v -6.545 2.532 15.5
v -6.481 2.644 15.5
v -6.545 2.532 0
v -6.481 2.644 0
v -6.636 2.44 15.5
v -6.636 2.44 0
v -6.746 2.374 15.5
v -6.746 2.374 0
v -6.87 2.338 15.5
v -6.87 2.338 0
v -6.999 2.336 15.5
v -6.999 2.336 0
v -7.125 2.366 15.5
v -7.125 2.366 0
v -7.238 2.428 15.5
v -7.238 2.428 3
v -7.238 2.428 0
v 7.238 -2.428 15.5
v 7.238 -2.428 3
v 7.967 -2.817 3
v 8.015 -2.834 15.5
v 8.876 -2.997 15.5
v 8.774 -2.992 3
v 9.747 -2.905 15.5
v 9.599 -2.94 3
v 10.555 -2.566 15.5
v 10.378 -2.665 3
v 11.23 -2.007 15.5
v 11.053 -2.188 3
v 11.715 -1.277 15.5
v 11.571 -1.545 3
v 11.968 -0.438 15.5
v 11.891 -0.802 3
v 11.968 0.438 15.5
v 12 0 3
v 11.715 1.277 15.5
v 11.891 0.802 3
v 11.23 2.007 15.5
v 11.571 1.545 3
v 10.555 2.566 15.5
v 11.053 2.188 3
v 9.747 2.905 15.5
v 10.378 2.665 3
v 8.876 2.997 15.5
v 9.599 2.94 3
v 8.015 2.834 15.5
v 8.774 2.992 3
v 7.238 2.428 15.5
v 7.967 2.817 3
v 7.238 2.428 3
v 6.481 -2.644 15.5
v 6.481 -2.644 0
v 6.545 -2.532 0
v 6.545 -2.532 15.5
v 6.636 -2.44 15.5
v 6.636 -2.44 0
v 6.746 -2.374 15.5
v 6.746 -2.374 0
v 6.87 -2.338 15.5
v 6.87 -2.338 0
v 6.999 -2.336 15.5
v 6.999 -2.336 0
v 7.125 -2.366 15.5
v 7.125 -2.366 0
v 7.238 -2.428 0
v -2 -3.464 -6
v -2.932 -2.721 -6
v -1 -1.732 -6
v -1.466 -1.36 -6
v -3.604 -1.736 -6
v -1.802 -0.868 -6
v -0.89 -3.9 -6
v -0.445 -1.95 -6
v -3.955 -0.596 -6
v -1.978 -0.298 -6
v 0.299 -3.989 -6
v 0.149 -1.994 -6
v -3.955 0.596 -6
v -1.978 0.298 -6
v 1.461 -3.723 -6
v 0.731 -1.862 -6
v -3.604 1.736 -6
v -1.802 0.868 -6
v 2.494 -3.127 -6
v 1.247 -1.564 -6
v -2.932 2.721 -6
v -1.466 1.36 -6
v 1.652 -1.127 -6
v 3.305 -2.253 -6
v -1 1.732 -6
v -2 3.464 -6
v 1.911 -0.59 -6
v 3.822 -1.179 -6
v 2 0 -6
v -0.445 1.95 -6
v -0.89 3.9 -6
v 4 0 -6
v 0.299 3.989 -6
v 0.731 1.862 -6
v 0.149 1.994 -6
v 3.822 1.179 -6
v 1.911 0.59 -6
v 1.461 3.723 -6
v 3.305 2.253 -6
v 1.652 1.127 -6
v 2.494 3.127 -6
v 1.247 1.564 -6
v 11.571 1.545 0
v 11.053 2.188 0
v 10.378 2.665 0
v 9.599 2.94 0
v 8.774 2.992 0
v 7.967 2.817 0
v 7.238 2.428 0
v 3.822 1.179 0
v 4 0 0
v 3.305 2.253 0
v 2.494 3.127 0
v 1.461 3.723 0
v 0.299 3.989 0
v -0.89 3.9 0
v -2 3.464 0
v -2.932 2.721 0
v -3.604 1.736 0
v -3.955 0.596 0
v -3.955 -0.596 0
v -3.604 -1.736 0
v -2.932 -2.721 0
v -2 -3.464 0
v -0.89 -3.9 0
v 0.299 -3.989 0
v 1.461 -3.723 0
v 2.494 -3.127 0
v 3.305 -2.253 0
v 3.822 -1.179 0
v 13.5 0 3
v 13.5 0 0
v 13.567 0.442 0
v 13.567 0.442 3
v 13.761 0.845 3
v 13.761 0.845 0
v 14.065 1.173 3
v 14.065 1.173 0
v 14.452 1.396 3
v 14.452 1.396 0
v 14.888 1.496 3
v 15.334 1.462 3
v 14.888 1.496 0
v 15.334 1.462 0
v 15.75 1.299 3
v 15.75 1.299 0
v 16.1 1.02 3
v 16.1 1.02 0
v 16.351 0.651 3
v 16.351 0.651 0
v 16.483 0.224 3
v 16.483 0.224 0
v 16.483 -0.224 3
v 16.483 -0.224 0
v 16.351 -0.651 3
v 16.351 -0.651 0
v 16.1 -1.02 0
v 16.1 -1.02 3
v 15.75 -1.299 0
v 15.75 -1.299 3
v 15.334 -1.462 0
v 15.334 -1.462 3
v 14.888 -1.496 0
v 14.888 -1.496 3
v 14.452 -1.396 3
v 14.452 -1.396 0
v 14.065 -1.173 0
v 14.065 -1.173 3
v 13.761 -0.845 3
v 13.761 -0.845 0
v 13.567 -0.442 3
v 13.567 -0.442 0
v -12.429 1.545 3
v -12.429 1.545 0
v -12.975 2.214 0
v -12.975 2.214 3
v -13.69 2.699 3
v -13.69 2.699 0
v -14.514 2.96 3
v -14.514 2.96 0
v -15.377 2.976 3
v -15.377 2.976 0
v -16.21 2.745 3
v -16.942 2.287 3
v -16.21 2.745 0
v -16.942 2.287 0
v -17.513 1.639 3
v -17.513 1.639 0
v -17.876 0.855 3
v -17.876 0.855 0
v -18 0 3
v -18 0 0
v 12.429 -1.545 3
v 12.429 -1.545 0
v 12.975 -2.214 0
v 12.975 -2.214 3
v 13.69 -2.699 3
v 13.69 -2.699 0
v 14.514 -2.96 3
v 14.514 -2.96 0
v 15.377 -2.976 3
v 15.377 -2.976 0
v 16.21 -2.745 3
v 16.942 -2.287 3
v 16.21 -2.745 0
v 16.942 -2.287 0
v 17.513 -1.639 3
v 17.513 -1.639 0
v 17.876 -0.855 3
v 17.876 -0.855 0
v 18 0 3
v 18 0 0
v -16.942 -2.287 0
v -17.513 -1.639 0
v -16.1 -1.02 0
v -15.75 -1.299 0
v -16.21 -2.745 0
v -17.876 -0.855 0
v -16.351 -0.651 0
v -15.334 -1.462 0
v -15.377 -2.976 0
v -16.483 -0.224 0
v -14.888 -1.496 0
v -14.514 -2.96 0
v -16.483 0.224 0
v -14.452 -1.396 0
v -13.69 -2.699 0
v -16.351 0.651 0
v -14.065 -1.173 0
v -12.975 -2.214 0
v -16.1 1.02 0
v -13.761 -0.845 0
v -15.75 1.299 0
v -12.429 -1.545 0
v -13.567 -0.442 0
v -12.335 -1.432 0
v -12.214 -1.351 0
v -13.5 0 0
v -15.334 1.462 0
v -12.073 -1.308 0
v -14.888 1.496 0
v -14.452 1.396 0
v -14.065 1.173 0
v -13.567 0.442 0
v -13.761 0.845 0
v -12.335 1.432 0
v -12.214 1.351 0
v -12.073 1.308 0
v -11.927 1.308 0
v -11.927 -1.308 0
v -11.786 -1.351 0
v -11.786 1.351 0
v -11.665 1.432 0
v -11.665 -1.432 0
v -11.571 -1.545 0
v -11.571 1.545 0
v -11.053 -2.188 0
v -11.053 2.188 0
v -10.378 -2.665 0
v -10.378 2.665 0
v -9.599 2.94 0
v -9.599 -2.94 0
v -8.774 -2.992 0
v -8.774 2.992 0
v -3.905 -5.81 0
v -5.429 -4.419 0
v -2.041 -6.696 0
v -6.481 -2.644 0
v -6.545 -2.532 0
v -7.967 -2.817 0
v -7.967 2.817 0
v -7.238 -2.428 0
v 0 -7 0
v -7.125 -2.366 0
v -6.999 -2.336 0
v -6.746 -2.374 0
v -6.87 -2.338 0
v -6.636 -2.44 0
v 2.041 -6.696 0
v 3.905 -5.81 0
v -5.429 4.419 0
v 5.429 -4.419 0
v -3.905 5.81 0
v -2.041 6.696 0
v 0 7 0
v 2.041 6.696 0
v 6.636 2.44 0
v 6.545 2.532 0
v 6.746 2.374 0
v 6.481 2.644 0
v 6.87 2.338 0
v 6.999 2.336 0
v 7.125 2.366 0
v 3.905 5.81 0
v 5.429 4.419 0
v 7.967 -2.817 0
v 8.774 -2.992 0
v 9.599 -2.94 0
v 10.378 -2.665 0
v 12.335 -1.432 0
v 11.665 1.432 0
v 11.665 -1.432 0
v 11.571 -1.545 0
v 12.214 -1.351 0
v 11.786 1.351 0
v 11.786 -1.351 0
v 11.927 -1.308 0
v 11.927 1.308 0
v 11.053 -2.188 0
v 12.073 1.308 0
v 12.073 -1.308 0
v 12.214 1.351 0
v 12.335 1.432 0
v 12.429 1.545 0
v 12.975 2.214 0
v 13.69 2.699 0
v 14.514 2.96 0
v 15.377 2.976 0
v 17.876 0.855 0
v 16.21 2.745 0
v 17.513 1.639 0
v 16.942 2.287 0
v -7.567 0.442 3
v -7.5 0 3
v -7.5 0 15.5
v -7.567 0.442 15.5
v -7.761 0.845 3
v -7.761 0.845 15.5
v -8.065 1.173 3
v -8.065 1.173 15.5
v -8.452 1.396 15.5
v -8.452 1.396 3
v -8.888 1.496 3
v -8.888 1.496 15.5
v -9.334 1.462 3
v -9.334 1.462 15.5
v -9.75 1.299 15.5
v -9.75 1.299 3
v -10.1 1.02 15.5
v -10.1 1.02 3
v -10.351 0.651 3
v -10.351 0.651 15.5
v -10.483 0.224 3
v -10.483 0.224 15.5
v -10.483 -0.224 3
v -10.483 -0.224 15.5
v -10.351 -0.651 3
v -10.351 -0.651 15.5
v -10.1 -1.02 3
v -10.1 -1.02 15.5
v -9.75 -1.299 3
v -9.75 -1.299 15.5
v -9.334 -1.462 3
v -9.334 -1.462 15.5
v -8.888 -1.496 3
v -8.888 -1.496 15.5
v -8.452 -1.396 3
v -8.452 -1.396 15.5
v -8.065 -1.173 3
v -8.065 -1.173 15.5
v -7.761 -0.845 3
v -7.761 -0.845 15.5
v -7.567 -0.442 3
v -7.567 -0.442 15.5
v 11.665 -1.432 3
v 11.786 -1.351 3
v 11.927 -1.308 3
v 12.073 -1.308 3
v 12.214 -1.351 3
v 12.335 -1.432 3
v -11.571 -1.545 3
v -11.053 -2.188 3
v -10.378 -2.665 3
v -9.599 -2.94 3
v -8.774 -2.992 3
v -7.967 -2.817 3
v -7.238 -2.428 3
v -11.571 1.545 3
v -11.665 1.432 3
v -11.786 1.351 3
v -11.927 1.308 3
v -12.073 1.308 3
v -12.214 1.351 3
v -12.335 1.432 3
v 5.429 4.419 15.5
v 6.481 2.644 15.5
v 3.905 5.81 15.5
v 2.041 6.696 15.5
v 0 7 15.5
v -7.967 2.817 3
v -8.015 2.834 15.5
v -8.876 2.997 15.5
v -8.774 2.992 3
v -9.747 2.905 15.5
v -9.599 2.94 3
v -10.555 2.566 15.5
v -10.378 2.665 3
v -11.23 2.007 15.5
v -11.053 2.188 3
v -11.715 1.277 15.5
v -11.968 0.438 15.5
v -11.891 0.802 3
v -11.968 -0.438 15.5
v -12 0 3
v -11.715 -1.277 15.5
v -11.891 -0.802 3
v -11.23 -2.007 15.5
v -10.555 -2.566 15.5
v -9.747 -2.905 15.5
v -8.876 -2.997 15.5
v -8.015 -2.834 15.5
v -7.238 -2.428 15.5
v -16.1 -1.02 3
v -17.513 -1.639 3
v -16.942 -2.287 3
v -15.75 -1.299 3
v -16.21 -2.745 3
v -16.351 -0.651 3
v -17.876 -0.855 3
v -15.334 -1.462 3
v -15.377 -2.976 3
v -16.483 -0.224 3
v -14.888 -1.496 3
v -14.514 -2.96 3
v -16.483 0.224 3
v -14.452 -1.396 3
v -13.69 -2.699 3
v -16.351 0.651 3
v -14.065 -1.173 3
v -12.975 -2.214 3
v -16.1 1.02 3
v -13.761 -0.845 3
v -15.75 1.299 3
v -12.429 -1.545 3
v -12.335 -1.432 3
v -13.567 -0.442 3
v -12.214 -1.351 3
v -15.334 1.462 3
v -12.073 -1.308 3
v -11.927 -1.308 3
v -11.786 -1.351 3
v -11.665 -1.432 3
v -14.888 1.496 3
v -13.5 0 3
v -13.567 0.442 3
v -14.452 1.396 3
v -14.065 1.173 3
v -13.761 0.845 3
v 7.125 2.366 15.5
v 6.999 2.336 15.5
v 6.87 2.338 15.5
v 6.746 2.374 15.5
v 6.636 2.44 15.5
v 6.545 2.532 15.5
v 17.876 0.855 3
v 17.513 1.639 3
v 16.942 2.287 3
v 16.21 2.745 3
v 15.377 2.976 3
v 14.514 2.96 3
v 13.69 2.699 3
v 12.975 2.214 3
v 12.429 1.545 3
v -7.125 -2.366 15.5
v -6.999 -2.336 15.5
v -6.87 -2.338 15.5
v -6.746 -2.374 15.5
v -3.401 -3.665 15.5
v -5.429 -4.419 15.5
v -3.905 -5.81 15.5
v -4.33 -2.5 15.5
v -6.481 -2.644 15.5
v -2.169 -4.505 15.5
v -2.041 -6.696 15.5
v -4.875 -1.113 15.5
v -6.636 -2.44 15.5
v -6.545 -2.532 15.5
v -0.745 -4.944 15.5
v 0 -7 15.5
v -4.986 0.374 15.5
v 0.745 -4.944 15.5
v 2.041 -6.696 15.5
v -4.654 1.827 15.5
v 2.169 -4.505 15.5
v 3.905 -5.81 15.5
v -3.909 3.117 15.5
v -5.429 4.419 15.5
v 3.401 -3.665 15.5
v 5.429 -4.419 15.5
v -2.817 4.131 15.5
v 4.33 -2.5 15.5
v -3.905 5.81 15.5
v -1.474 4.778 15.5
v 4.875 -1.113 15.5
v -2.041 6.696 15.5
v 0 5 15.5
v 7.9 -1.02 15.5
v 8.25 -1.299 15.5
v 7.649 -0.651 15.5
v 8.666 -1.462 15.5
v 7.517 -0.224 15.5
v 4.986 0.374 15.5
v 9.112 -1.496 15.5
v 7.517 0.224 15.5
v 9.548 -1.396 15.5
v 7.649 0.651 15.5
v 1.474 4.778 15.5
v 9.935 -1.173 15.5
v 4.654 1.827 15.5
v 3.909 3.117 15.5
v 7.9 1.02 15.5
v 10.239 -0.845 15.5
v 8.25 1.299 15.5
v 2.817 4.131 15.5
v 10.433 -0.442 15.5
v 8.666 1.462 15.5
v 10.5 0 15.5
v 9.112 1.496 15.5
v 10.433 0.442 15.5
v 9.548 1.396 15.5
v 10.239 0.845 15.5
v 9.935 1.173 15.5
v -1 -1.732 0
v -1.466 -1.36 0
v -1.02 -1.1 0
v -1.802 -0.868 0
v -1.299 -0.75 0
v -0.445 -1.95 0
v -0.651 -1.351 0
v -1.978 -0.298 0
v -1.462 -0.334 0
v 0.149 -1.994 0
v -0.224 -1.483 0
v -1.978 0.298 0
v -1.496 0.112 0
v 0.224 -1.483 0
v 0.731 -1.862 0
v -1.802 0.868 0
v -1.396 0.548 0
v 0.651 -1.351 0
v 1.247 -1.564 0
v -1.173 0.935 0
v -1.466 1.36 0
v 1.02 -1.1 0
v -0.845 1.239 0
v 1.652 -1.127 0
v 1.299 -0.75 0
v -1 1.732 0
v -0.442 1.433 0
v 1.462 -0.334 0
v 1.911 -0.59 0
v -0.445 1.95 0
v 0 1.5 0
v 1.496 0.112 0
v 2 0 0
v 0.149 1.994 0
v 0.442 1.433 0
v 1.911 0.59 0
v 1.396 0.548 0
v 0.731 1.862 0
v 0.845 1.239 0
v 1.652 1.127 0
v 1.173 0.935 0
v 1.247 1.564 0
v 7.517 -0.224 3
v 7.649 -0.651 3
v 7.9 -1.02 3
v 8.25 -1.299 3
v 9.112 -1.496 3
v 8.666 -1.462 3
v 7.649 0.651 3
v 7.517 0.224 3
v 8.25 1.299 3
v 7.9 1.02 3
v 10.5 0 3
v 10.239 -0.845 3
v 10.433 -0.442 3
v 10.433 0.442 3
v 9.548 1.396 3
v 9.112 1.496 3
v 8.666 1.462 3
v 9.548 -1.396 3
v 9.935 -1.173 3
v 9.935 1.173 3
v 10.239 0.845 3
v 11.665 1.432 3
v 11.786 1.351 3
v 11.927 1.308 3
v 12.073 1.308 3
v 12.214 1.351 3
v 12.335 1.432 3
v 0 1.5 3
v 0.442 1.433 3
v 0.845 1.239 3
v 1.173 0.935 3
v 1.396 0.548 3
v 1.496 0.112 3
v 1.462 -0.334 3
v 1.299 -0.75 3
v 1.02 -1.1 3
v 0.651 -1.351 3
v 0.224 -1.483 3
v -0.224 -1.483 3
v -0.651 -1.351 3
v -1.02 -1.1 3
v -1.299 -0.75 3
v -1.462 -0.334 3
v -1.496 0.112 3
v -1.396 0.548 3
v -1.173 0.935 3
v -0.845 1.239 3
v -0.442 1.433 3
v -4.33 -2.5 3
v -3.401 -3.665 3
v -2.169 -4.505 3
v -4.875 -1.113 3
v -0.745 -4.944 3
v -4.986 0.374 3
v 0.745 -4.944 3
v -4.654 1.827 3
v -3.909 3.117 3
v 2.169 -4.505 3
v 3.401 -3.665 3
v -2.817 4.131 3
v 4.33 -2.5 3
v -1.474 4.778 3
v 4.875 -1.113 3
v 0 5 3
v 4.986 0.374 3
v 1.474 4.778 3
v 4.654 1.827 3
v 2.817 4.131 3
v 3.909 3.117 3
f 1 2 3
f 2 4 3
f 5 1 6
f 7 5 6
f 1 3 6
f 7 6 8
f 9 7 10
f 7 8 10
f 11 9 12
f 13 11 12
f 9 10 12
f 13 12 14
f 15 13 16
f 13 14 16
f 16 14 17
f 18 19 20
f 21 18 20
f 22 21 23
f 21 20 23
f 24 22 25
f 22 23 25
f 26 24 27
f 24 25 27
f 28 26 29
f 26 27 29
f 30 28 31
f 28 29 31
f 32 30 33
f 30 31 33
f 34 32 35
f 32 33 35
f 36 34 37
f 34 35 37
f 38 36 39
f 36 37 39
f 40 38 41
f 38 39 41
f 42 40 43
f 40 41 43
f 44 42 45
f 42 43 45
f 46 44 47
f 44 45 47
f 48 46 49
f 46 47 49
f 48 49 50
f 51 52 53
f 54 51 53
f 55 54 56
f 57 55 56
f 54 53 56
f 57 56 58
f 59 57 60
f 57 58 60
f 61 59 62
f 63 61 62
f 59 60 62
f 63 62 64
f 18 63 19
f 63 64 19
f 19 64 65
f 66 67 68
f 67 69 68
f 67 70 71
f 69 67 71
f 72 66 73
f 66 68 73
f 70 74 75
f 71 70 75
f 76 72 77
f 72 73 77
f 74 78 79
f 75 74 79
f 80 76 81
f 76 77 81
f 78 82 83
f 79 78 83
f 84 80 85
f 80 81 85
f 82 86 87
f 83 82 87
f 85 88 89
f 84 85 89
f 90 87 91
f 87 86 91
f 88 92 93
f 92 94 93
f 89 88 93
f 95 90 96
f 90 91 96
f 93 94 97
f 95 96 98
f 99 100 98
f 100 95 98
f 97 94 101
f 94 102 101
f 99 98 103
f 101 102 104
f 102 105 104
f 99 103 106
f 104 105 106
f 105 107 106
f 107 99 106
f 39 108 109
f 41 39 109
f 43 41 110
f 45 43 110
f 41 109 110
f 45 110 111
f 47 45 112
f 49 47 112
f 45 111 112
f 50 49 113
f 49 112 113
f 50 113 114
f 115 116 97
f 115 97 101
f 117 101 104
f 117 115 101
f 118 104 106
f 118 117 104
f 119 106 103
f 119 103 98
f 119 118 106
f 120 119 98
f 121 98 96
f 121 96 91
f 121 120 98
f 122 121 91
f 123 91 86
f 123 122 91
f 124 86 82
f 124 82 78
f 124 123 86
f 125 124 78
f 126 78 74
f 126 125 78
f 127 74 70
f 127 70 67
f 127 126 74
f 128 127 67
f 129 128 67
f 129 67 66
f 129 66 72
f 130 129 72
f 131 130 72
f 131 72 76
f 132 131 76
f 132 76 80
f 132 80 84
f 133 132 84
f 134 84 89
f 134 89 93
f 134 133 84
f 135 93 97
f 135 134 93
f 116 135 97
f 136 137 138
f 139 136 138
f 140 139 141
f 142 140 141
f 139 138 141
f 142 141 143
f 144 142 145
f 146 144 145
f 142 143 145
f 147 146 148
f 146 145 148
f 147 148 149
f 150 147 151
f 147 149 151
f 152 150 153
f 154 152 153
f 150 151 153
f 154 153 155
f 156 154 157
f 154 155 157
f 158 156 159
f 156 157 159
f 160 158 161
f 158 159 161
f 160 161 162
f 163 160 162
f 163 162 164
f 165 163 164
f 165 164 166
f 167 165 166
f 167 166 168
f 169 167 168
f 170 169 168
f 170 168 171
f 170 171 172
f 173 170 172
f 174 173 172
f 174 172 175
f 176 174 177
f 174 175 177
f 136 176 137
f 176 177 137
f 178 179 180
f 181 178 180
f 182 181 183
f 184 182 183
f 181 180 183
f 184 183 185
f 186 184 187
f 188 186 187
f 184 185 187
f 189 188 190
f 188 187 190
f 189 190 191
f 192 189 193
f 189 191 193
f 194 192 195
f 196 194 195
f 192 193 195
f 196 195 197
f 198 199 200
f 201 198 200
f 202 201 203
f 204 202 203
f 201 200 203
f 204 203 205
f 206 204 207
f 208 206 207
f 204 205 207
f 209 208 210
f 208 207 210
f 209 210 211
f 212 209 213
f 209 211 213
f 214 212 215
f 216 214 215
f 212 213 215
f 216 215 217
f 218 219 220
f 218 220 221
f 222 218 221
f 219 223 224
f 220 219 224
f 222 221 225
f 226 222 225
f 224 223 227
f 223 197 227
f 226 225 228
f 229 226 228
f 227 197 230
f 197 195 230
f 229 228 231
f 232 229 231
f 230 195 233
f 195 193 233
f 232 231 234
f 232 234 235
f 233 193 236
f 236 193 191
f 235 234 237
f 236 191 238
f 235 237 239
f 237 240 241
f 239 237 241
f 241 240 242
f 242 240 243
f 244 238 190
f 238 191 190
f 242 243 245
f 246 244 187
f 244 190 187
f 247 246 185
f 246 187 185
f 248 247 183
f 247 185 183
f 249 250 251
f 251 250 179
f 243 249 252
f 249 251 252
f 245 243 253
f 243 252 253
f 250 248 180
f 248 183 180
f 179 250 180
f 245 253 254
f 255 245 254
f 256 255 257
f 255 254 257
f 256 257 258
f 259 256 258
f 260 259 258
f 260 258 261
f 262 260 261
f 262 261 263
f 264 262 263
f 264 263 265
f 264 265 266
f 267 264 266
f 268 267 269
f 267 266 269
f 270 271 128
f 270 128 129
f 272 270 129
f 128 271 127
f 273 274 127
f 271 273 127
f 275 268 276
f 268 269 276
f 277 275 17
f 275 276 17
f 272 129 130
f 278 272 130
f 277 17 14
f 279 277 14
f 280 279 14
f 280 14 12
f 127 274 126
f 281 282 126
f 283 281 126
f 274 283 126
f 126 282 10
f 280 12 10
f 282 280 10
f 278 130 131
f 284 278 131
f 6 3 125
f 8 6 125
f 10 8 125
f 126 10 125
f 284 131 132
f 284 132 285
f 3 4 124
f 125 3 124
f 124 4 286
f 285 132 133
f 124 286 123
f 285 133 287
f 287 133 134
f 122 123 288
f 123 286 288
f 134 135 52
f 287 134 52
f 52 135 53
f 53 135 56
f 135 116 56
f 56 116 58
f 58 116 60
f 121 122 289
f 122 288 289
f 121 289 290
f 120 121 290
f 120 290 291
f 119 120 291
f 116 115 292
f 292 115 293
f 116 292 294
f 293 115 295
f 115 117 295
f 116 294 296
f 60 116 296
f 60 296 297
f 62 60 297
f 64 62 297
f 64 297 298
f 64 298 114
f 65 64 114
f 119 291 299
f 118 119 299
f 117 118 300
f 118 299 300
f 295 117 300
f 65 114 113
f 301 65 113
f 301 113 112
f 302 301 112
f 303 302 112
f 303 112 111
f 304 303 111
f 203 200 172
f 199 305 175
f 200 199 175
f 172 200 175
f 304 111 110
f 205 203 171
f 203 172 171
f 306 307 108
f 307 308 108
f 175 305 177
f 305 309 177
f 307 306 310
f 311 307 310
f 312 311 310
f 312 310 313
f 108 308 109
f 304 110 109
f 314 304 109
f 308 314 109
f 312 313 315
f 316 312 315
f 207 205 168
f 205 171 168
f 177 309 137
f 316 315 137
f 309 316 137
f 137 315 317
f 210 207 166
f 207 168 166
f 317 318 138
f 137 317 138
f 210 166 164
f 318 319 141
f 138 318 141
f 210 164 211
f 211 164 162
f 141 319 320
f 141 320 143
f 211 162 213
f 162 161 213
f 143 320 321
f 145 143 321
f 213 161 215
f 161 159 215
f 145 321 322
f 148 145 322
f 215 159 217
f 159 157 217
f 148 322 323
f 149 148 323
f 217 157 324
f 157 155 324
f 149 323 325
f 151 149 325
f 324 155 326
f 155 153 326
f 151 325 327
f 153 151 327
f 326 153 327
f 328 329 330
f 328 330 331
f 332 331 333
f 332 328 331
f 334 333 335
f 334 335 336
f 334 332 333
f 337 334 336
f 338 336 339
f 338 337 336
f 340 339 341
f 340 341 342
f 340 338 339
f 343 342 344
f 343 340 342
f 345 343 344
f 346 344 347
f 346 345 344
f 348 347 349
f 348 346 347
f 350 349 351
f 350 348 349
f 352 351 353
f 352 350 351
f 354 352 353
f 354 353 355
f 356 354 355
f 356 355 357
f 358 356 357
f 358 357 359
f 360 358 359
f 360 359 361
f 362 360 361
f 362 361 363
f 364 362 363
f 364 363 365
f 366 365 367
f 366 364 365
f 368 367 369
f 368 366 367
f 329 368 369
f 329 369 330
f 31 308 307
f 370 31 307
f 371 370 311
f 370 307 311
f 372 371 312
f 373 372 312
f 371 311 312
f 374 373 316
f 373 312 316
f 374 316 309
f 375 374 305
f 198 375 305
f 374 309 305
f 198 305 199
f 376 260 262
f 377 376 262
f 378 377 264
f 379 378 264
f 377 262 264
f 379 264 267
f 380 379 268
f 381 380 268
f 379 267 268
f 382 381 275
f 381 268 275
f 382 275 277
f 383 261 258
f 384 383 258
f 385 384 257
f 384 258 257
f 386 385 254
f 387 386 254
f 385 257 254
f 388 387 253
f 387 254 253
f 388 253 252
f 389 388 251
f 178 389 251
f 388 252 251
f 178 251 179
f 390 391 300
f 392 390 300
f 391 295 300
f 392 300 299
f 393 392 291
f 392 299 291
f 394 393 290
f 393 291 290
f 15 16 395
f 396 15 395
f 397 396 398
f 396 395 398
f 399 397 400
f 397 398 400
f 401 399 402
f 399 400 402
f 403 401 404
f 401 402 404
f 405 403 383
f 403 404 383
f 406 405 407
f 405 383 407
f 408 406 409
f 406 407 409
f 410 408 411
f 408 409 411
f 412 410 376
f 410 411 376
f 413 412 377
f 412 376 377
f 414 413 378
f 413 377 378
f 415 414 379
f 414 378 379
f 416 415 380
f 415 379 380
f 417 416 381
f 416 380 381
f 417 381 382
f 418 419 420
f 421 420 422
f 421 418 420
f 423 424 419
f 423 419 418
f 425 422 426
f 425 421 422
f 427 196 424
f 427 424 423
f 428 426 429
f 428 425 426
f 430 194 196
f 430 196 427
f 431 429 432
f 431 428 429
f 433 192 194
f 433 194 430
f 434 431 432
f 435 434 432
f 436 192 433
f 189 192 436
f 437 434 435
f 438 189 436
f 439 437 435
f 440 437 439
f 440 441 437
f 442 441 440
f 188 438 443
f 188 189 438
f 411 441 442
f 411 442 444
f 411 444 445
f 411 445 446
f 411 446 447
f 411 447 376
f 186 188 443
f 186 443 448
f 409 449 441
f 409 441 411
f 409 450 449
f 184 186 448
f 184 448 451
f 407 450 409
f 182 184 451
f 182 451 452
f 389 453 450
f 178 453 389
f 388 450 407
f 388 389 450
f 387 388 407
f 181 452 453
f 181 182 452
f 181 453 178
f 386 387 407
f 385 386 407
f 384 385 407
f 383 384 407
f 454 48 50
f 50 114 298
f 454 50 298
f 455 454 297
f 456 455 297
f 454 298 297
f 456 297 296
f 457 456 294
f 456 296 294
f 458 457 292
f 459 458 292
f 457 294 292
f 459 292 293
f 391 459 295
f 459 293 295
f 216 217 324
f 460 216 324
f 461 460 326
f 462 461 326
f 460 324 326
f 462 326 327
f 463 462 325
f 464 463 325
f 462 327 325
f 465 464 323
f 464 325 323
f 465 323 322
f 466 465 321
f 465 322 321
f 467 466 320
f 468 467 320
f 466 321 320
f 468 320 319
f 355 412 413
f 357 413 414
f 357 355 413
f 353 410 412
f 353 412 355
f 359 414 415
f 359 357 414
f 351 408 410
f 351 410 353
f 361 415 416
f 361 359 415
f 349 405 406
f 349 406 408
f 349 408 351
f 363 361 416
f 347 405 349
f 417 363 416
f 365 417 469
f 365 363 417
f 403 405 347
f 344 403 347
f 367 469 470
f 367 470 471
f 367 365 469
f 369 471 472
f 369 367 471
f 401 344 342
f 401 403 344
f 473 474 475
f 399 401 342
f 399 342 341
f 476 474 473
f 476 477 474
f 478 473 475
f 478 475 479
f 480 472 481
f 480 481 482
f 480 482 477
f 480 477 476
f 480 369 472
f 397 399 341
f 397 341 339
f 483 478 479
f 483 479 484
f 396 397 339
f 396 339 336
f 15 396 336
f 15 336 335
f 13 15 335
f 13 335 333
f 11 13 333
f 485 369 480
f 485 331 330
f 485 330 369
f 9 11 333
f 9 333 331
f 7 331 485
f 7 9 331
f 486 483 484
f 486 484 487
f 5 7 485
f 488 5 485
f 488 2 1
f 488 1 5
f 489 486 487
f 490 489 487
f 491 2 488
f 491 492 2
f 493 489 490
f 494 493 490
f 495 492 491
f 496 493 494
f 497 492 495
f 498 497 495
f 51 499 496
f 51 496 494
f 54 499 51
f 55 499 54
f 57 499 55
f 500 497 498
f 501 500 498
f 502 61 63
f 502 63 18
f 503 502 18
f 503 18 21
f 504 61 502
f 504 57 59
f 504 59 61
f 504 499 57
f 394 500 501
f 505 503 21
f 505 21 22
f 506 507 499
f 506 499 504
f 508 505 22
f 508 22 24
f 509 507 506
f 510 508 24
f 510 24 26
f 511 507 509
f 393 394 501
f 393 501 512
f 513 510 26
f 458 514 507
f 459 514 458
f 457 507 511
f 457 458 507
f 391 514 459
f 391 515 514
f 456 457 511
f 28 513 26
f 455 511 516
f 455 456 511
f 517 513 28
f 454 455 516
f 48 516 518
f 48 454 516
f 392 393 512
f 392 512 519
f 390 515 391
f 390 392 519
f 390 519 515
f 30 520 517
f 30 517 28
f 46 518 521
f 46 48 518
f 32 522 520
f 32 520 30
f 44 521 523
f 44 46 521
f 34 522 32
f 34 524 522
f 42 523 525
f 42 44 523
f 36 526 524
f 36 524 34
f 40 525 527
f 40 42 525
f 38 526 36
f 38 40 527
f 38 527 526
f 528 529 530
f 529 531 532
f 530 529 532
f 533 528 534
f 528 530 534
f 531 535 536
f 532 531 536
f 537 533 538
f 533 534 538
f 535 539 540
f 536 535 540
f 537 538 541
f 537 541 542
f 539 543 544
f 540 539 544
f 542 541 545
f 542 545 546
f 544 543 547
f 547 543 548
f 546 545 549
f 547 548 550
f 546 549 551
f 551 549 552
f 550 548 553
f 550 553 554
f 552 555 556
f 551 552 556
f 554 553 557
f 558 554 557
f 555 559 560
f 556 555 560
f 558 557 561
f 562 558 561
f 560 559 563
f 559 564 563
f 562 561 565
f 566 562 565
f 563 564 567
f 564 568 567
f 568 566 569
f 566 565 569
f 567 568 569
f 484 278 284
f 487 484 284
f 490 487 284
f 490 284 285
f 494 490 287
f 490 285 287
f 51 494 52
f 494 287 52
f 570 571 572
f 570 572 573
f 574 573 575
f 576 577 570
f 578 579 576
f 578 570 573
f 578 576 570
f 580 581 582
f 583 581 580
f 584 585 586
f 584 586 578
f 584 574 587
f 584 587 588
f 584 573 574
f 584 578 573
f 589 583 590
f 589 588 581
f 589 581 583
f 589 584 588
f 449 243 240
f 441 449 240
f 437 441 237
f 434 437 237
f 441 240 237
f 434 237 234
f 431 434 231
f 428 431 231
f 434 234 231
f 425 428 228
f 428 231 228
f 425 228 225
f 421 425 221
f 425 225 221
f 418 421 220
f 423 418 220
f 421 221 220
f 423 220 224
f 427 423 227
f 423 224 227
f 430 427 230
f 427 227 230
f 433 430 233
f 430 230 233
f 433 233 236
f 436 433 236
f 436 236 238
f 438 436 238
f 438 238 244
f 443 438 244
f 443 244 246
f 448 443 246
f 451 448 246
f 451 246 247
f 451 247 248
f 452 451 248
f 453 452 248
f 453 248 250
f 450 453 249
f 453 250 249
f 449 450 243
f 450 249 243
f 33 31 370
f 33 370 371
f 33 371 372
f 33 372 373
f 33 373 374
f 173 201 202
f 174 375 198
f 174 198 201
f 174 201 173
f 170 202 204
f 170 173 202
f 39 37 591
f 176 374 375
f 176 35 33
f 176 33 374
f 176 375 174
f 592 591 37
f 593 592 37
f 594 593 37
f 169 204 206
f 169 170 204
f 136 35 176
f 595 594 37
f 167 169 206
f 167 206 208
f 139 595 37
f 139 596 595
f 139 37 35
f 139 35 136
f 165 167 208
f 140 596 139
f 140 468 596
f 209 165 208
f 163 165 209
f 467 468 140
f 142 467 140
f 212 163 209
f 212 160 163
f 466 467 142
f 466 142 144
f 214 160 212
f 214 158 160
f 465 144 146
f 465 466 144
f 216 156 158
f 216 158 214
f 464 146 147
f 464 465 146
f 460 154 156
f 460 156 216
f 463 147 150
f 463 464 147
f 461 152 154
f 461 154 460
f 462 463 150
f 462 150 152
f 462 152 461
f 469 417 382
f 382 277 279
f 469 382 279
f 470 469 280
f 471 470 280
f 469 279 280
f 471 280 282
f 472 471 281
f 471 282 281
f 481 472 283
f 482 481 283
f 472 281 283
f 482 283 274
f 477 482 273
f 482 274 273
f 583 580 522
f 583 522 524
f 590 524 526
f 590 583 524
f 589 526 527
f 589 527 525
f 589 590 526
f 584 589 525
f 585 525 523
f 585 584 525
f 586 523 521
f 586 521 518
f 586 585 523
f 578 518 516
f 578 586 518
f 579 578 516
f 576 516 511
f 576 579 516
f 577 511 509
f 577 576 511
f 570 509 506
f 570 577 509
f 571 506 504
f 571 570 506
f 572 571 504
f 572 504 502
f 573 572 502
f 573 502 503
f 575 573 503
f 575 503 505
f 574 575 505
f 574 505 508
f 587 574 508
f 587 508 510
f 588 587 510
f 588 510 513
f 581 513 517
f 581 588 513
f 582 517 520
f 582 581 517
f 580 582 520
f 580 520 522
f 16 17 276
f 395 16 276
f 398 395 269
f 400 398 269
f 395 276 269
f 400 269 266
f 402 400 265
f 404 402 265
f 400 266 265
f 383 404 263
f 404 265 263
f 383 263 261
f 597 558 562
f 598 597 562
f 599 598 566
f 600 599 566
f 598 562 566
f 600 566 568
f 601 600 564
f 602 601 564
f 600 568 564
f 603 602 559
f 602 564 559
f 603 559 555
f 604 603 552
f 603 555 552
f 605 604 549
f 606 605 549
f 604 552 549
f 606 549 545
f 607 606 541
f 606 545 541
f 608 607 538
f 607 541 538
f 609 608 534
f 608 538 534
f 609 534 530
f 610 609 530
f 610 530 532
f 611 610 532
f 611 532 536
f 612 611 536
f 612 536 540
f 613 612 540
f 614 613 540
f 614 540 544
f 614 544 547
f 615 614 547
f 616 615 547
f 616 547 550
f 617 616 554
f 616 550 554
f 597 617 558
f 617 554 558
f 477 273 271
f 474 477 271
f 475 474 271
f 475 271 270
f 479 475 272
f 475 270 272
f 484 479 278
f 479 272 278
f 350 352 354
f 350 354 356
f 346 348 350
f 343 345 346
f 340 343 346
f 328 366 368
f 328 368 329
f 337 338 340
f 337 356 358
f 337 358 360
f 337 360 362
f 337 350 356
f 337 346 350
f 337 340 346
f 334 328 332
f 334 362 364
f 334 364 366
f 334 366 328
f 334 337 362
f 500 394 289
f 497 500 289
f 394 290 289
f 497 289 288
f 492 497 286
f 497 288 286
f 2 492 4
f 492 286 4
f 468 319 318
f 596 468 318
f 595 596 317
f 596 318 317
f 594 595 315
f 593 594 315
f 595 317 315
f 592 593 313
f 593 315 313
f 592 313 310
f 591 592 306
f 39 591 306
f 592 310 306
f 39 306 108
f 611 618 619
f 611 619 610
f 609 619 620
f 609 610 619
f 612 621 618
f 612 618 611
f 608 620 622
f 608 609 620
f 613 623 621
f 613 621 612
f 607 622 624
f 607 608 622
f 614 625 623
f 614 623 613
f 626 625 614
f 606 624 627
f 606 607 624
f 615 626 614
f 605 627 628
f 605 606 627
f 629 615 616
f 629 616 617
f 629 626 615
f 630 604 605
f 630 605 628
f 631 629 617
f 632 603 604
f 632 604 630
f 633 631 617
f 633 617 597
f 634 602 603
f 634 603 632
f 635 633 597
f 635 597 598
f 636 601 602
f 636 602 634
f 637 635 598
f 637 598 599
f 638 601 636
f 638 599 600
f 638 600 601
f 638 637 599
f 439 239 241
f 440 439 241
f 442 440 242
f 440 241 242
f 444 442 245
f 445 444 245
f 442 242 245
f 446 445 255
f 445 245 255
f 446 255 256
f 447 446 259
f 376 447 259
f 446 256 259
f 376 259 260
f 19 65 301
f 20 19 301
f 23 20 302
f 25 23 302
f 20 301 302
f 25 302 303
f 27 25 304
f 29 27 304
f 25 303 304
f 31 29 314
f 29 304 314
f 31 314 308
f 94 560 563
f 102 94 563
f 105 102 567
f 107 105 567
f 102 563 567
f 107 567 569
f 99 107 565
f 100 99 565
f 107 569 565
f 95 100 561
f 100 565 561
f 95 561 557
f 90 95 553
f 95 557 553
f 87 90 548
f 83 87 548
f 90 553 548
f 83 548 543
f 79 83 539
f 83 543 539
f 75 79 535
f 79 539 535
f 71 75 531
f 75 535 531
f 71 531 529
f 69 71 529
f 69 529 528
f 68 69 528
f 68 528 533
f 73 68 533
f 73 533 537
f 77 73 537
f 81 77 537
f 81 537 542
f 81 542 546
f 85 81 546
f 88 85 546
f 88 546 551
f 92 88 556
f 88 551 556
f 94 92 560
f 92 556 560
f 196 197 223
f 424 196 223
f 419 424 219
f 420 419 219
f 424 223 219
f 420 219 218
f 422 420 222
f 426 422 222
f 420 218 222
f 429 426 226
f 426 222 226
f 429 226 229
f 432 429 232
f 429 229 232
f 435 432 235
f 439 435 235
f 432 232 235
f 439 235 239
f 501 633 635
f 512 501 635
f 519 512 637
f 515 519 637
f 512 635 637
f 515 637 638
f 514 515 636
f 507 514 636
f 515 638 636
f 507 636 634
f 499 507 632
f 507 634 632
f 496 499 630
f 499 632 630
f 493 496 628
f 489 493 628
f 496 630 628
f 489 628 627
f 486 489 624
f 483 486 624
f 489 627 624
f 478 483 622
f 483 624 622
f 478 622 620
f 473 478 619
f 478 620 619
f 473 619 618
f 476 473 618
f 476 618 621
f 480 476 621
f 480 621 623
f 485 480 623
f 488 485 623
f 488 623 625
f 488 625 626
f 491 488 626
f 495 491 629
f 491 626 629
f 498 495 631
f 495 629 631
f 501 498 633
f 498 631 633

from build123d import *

# Parameters (mm, degrees)
F1_DEPTH = 3
F2_R     = 1.5
F3_DEPTH = 12.5
F4_R     = 4
F4_R_2   = 2
F5_DEPTH = 6


with BuildPart() as f1:
    # F0 (on Top) → F1 (new body)
    with BuildSketch(Plane.XY):
        with BuildLine():
            ThreePointArc((7.238095, 2.428105), (6.807286, 2.351969), (6.481481, 2.643936))
            ThreePointArc((6.481481, 2.643936), (3.904641, 5.8098), (0, 7))
            ThreePointArc((0, 7), (-3.904641, 5.8098), (-6.481481, 2.643936))
            ThreePointArc((-6.481481, 2.643936), (-6.807286, 2.351969), (-7.238095, 2.428105))
            ThreePointArc((-7.238095, 2.428105), (-9.598913, 2.939609), (-11.571429, 1.545236))
            ThreePointArc((-11.571429, 1.545236), (-12, 1.302776), (-12.428571, 1.545236))
            ThreePointArc((-12.428571, 1.545236), (-15.801784, 2.890872), (-18, 0))
            ThreePointArc((-18, 0), (-15.801784, -2.890872), (-12.428571, -1.545236))
            ThreePointArc((-12.428571, -1.545236), (-12, -1.302776), (-11.571429, -1.545236))
            ThreePointArc((-11.571429, -1.545236), (-9.598913, -2.939609), (-7.238095, -2.428105))
            ThreePointArc((-7.238095, -2.428105), (-6.807286, -2.351969), (-6.481481, -2.643936))
            ThreePointArc((-6.481481, -2.643936), (-3.904641, -5.8098), (0, -7))
            ThreePointArc((0, -7), (3.904641, -5.8098), (6.481481, -2.643936))
            ThreePointArc((6.481481, -2.643936), (6.807286, -2.351969), (7.238095, -2.428105))
            ThreePointArc((7.238095, -2.428105), (9.598913, -2.939609), (11.571429, -1.545236))
            ThreePointArc((11.571429, -1.545236), (12, -1.302776), (12.428571, -1.545236))
            ThreePointArc((12.428571, -1.545236), (15.801784, -2.890872), (18, 0))
            ThreePointArc((18, 0), (15.801784, 2.890872), (12.428571, 1.545236))
            ThreePointArc((12.428571, 1.545236), (12, 1.302776), (11.571429, 1.545236))
            ThreePointArc((11.571429, 1.545236), (9.598913, 2.939609), (7.238095, 2.428105))
        make_face()
        with BuildLine():
            ThreePointArc((-16.5, 0), (-15, 1.5), (-13.5, 0))
            ThreePointArc((-13.5, 0), (-15, -1.5), (-16.5, 0))
        make_face(mode=Mode.SUBTRACT)
        with BuildLine():
            ThreePointArc((0, -1.5), (-1.5, 0), (0, 1.5))
            ThreePointArc((0, 1.5), (1.5, 0), (0, -1.5))
        make_face(mode=Mode.SUBTRACT)
        with BuildLine():
            ThreePointArc((16.5, 0), (15, -1.5), (13.5, 0))
            ThreePointArc((13.5, 0), (15, 1.5), (16.5, 0))
        make_face(mode=Mode.SUBTRACT)
    extrude(amount=F1_DEPTH)

    # F2 (on face) → F3 (join)
    with BuildSketch(Plane.XY.offset(3)):
        with BuildLine():
            ThreePointArc((7.238095, 2.428105), (6.807286, 2.351969), (6.481481, 2.643936))
            ThreePointArc((6.481481, 2.643936), (3.904641, 5.8098), (0, 7))
            ThreePointArc((0, 7), (-3.904641, 5.8098), (-6.481481, 2.643936))
            ThreePointArc((-6.481481, 2.643936), (-6.807286, 2.351969), (-7.238095, 2.428105))
            ThreePointArc((-7.238095, 2.428105), (-12, 0), (-7.238095, -2.428105))
            ThreePointArc((-7.238095, -2.428105), (-6.807286, -2.351969), (-6.481481, -2.643936))
            ThreePointArc((-6.481481, -2.643936), (-3.904641, -5.8098), (0, -7))
            ThreePointArc((0, -7), (3.904641, -5.8098), (6.481481, -2.643936))
            ThreePointArc((6.481481, -2.643936), (6.807286, -2.351969), (7.238095, -2.428105))
            ThreePointArc((7.238095, -2.428105), (12, 0), (7.238095, 2.428105))
        make_face()
        with Locations((-9, 0)):
            Circle(F2_R, mode=Mode.SUBTRACT)
        with BuildLine():
            ThreePointArc((0, -5), (-5, 0), (0, 5))
            ThreePointArc((0, 5), (5, 0), (0, -5))
        make_face(mode=Mode.SUBTRACT)
        with Locations((9, 0)):
            Circle(F2_R, mode=Mode.SUBTRACT)
    extrude(amount=F3_DEPTH)

    # F4 (on face) → F5 (join)
    with BuildSketch(Plane.XY):
        Circle(F4_R)
        Circle(F4_R_2, mode=Mode.SUBTRACT)
    extrude(amount=-F5_DEPTH)


solid = f1.part
